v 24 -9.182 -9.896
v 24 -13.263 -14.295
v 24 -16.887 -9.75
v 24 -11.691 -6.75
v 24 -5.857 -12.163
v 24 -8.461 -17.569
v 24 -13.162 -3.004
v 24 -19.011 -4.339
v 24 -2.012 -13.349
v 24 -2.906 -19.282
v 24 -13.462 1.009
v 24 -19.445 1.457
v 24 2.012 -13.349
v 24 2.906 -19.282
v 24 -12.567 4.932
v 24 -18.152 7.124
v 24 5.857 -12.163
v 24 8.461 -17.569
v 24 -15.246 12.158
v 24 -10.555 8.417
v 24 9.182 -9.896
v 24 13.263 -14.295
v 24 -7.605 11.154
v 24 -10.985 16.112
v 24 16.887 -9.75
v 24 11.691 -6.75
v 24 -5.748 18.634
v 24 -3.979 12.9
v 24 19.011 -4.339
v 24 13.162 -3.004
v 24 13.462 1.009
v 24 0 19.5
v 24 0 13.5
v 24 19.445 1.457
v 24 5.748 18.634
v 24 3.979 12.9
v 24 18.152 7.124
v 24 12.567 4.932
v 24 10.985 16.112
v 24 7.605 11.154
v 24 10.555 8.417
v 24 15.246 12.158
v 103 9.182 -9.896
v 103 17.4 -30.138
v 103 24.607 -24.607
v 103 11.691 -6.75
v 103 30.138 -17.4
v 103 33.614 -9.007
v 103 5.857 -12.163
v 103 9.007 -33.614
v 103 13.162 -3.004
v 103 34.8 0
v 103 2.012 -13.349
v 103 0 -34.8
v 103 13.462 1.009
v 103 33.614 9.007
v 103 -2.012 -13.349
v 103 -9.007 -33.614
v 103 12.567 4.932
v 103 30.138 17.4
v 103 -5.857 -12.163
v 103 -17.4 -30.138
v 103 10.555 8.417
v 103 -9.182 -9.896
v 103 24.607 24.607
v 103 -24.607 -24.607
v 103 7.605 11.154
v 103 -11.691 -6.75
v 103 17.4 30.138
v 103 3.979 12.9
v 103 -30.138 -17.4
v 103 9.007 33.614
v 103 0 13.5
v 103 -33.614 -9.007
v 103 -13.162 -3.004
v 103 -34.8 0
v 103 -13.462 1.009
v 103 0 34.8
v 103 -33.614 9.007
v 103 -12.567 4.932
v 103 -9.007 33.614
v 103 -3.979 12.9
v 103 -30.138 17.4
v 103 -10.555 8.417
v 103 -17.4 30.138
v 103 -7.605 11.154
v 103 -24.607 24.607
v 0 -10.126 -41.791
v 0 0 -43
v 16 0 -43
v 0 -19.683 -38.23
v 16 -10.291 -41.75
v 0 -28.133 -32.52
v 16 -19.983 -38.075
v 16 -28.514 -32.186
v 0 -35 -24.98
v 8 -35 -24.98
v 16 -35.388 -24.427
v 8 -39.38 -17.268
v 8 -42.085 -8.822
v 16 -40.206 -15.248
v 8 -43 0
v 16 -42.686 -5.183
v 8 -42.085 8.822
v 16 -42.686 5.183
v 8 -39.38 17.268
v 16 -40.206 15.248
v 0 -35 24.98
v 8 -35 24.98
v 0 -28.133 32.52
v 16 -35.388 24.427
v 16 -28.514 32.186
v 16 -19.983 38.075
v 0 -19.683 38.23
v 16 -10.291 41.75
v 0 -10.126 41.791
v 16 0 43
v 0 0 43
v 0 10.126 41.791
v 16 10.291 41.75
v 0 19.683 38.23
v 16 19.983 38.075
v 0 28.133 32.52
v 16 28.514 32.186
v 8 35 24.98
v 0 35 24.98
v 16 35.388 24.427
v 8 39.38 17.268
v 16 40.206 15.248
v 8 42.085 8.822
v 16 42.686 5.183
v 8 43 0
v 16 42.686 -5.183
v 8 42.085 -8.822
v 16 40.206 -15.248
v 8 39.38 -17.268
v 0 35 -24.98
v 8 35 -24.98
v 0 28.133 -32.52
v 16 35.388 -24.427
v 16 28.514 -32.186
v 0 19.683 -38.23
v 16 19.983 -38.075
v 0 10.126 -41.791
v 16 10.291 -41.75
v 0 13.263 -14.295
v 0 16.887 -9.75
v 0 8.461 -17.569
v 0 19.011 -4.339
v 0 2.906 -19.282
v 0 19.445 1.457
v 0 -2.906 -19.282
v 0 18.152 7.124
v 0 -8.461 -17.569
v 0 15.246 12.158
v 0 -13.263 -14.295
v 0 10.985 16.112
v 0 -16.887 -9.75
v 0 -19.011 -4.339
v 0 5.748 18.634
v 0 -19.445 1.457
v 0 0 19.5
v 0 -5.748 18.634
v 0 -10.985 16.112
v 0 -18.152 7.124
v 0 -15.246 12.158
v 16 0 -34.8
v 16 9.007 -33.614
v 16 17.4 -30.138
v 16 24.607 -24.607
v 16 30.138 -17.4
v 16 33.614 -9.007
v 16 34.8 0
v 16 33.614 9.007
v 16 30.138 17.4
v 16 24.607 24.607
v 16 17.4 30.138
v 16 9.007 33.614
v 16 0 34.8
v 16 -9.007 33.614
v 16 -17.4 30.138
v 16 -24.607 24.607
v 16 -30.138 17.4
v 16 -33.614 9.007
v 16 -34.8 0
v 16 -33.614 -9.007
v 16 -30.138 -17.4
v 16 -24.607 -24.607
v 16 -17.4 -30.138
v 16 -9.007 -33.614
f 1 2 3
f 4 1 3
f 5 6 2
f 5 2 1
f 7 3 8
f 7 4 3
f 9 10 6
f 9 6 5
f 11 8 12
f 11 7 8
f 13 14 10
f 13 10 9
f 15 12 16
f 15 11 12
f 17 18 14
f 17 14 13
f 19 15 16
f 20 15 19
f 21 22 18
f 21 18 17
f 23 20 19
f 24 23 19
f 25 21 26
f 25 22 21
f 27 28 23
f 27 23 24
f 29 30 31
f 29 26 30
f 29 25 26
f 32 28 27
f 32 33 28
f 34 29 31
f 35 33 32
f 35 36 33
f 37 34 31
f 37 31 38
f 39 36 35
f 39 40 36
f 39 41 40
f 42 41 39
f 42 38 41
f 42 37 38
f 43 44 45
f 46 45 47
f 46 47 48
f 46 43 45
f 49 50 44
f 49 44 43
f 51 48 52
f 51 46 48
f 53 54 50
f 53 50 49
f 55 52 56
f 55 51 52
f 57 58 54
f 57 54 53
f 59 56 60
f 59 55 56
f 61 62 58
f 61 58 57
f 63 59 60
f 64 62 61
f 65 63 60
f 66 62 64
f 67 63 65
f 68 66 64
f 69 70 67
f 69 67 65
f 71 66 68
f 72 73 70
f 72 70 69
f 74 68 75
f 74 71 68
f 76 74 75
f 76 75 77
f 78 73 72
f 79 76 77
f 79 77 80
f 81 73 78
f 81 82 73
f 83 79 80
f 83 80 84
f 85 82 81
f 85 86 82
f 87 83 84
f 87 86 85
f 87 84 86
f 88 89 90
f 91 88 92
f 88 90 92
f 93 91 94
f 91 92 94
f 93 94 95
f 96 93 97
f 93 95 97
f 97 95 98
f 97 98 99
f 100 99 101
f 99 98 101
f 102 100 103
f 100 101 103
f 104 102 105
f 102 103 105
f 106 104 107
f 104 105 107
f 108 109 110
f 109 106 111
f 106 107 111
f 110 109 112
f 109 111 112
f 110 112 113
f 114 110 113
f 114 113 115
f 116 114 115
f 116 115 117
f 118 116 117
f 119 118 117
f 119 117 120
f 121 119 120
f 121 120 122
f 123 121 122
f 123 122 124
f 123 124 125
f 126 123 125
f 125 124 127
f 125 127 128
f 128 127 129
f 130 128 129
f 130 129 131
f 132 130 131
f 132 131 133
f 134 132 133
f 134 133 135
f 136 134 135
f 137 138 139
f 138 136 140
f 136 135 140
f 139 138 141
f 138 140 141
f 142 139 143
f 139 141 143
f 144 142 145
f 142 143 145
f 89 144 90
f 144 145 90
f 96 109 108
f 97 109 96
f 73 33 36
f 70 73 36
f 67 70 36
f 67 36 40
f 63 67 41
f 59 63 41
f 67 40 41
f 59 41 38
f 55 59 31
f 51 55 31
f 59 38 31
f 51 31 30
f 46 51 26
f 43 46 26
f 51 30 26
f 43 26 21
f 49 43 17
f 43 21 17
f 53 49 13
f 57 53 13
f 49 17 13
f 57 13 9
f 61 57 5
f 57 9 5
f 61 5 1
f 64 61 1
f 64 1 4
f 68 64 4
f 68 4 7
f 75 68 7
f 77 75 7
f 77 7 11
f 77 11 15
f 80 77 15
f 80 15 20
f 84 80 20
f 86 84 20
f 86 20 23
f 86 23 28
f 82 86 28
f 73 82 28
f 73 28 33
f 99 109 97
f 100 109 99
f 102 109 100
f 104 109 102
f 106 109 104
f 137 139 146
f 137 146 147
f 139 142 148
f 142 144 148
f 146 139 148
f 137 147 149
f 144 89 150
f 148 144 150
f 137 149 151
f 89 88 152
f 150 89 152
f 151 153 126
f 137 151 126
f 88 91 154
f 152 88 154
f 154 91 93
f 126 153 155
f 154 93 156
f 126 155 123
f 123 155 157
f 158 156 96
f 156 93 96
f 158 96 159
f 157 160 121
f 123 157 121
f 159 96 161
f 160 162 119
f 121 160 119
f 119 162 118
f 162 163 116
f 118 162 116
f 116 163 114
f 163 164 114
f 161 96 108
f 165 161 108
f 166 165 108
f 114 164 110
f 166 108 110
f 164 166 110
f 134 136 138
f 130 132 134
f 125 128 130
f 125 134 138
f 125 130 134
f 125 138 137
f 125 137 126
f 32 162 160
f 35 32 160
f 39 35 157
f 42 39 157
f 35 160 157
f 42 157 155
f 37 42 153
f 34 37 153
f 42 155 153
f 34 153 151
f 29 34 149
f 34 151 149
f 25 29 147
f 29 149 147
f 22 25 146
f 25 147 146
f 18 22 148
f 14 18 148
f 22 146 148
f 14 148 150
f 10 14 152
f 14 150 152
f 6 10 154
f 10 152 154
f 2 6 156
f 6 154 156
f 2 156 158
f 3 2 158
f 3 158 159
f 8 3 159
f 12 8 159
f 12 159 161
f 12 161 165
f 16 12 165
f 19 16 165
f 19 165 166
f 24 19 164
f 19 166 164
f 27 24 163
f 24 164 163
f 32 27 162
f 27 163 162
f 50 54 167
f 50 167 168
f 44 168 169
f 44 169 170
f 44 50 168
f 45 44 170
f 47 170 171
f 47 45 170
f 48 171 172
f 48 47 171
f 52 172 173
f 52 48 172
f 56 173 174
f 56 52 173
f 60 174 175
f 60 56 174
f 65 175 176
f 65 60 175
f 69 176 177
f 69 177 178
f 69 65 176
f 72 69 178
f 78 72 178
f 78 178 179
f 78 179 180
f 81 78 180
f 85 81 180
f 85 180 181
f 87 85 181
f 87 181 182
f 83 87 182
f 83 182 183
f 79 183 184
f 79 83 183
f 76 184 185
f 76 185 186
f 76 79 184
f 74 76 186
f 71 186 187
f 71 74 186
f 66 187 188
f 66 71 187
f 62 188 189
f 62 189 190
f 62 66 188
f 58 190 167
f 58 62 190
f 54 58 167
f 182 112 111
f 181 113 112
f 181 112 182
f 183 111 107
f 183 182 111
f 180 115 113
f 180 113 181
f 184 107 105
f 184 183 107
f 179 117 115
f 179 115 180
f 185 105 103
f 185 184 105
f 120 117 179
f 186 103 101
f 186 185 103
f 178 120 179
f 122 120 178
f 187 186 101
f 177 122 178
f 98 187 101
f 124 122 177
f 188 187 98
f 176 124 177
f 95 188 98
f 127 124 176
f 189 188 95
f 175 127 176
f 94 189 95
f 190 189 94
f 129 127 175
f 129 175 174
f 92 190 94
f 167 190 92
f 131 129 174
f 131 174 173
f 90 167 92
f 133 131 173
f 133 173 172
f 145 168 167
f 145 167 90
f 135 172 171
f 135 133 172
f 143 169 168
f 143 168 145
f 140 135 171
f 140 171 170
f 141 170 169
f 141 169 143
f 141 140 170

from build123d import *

# Parameters (mm, degrees)
ESQUISSE2_W                  = 103
ESQUISSE2_H                  = 43
ESQUISSE3_OUTSIDE_W          = 119.876
ESQUISSE3_OUTSIDE_H          = 119.876
ESQUISSE3_OUTSIDE_R          = 34.8
ENL_V_MAT_EXTRU_1_DEPTH      = 87
ENL_V_MAT_EXTRU_2_DEPTH      = 120.61187232
ENL_V_MAT_EXTRU_2_DEPTH_BACK = 8
ENL_V_MAT_EXTRU_3_DEPTH      = 120.61187232
ENL_V_MAT_EXTRU_3_DEPTH_BACK = 8
ESQUISSE7_R                  = 19.5
ENL_V_MAT_EXTRU_4_DEPTH      = 24
ESQUISSE8_R                  = 13.5
ENL_V_MAT_EXTRU_5_DEPTH      = 100.694533451


with BuildPart() as part:
    # Esquisse2 → Révolution1 (revolve)
    with BuildSketch(Plane.XY, mode=Mode.PRIVATE) as r_volution1_sk:
        with Locations((51.5, 21.5)):
            Rectangle(ESQUISSE2_W, ESQUISSE2_H)
    revolve(r_volution1_sk.sketch.rotate(Axis((103, 0, 0), (-1, 0, 0)), 90), axis=Axis((103, 0, 0), (-1, 0, 0)))

    # Esquisse3 outside → Enlèv. mat.-Extru.1 (cut)
    with BuildSketch(Plane(origin=(103, 0, 0), x_dir=(0, 0, -1), z_dir=(1, 0, 0))):
        Rectangle(ESQUISSE3_OUTSIDE_W, ESQUISSE3_OUTSIDE_H)
        Circle(ESQUISSE3_OUTSIDE_R, mode=Mode.SUBTRACT)
    extrude(amount=-ENL_V_MAT_EXTRU_1_DEPTH, mode=Mode.SUBTRACT)

    # Esquisse4 → Enlèv. mat.-Extru.2 (cut, two sides: drawn at the far end of the back side and taken through both)
    with BuildSketch(Plane.ZY.offset(-ENL_V_MAT_EXTRU_2_DEPTH_BACK)):
        Polygon((-241.912631386, 35), (-24.979991994, 35), (24.979991994, 35), (241.912631386, 35), (241.912631386, 468.865278784), (-241.912631386, 468.865278784), align=None)
    extrude(amount=ENL_V_MAT_EXTRU_2_DEPTH + ENL_V_MAT_EXTRU_2_DEPTH_BACK, mode=Mode.SUBTRACT)

    # Esquisse5 → Enlèv. mat.-Extru.3 (cut, two sides: drawn at the far end of the back side and taken through both)
    with BuildSketch(Plane.ZY.offset(-ENL_V_MAT_EXTRU_3_DEPTH_BACK)):
        Polygon((-241.912631386, -35), (-24.979991994, -35), (24.979991994, -35), (241.912631386, -35), (241.912631386, -468.865278784), (-241.912631386, -468.865278784), align=None)
    extrude(amount=ENL_V_MAT_EXTRU_3_DEPTH + ENL_V_MAT_EXTRU_3_DEPTH_BACK, mode=Mode.SUBTRACT)

    # Esquisse7 → Enlèv. mat.-Extru.4 (cut)
    with BuildSketch(Plane.ZY):
        Circle(ESQUISSE7_R)
    extrude(amount=-ENL_V_MAT_EXTRU_4_DEPTH, mode=Mode.SUBTRACT)

    # Esquisse8 → Enlèv. mat.-Extru.5 (cut, through all)
    with BuildSketch(Plane.ZY.offset(-24)):
        Circle(ESQUISSE8_R)
    extrude(amount=-ENL_V_MAT_EXTRU_5_DEPTH, mode=Mode.SUBTRACT)


solid = part.part
